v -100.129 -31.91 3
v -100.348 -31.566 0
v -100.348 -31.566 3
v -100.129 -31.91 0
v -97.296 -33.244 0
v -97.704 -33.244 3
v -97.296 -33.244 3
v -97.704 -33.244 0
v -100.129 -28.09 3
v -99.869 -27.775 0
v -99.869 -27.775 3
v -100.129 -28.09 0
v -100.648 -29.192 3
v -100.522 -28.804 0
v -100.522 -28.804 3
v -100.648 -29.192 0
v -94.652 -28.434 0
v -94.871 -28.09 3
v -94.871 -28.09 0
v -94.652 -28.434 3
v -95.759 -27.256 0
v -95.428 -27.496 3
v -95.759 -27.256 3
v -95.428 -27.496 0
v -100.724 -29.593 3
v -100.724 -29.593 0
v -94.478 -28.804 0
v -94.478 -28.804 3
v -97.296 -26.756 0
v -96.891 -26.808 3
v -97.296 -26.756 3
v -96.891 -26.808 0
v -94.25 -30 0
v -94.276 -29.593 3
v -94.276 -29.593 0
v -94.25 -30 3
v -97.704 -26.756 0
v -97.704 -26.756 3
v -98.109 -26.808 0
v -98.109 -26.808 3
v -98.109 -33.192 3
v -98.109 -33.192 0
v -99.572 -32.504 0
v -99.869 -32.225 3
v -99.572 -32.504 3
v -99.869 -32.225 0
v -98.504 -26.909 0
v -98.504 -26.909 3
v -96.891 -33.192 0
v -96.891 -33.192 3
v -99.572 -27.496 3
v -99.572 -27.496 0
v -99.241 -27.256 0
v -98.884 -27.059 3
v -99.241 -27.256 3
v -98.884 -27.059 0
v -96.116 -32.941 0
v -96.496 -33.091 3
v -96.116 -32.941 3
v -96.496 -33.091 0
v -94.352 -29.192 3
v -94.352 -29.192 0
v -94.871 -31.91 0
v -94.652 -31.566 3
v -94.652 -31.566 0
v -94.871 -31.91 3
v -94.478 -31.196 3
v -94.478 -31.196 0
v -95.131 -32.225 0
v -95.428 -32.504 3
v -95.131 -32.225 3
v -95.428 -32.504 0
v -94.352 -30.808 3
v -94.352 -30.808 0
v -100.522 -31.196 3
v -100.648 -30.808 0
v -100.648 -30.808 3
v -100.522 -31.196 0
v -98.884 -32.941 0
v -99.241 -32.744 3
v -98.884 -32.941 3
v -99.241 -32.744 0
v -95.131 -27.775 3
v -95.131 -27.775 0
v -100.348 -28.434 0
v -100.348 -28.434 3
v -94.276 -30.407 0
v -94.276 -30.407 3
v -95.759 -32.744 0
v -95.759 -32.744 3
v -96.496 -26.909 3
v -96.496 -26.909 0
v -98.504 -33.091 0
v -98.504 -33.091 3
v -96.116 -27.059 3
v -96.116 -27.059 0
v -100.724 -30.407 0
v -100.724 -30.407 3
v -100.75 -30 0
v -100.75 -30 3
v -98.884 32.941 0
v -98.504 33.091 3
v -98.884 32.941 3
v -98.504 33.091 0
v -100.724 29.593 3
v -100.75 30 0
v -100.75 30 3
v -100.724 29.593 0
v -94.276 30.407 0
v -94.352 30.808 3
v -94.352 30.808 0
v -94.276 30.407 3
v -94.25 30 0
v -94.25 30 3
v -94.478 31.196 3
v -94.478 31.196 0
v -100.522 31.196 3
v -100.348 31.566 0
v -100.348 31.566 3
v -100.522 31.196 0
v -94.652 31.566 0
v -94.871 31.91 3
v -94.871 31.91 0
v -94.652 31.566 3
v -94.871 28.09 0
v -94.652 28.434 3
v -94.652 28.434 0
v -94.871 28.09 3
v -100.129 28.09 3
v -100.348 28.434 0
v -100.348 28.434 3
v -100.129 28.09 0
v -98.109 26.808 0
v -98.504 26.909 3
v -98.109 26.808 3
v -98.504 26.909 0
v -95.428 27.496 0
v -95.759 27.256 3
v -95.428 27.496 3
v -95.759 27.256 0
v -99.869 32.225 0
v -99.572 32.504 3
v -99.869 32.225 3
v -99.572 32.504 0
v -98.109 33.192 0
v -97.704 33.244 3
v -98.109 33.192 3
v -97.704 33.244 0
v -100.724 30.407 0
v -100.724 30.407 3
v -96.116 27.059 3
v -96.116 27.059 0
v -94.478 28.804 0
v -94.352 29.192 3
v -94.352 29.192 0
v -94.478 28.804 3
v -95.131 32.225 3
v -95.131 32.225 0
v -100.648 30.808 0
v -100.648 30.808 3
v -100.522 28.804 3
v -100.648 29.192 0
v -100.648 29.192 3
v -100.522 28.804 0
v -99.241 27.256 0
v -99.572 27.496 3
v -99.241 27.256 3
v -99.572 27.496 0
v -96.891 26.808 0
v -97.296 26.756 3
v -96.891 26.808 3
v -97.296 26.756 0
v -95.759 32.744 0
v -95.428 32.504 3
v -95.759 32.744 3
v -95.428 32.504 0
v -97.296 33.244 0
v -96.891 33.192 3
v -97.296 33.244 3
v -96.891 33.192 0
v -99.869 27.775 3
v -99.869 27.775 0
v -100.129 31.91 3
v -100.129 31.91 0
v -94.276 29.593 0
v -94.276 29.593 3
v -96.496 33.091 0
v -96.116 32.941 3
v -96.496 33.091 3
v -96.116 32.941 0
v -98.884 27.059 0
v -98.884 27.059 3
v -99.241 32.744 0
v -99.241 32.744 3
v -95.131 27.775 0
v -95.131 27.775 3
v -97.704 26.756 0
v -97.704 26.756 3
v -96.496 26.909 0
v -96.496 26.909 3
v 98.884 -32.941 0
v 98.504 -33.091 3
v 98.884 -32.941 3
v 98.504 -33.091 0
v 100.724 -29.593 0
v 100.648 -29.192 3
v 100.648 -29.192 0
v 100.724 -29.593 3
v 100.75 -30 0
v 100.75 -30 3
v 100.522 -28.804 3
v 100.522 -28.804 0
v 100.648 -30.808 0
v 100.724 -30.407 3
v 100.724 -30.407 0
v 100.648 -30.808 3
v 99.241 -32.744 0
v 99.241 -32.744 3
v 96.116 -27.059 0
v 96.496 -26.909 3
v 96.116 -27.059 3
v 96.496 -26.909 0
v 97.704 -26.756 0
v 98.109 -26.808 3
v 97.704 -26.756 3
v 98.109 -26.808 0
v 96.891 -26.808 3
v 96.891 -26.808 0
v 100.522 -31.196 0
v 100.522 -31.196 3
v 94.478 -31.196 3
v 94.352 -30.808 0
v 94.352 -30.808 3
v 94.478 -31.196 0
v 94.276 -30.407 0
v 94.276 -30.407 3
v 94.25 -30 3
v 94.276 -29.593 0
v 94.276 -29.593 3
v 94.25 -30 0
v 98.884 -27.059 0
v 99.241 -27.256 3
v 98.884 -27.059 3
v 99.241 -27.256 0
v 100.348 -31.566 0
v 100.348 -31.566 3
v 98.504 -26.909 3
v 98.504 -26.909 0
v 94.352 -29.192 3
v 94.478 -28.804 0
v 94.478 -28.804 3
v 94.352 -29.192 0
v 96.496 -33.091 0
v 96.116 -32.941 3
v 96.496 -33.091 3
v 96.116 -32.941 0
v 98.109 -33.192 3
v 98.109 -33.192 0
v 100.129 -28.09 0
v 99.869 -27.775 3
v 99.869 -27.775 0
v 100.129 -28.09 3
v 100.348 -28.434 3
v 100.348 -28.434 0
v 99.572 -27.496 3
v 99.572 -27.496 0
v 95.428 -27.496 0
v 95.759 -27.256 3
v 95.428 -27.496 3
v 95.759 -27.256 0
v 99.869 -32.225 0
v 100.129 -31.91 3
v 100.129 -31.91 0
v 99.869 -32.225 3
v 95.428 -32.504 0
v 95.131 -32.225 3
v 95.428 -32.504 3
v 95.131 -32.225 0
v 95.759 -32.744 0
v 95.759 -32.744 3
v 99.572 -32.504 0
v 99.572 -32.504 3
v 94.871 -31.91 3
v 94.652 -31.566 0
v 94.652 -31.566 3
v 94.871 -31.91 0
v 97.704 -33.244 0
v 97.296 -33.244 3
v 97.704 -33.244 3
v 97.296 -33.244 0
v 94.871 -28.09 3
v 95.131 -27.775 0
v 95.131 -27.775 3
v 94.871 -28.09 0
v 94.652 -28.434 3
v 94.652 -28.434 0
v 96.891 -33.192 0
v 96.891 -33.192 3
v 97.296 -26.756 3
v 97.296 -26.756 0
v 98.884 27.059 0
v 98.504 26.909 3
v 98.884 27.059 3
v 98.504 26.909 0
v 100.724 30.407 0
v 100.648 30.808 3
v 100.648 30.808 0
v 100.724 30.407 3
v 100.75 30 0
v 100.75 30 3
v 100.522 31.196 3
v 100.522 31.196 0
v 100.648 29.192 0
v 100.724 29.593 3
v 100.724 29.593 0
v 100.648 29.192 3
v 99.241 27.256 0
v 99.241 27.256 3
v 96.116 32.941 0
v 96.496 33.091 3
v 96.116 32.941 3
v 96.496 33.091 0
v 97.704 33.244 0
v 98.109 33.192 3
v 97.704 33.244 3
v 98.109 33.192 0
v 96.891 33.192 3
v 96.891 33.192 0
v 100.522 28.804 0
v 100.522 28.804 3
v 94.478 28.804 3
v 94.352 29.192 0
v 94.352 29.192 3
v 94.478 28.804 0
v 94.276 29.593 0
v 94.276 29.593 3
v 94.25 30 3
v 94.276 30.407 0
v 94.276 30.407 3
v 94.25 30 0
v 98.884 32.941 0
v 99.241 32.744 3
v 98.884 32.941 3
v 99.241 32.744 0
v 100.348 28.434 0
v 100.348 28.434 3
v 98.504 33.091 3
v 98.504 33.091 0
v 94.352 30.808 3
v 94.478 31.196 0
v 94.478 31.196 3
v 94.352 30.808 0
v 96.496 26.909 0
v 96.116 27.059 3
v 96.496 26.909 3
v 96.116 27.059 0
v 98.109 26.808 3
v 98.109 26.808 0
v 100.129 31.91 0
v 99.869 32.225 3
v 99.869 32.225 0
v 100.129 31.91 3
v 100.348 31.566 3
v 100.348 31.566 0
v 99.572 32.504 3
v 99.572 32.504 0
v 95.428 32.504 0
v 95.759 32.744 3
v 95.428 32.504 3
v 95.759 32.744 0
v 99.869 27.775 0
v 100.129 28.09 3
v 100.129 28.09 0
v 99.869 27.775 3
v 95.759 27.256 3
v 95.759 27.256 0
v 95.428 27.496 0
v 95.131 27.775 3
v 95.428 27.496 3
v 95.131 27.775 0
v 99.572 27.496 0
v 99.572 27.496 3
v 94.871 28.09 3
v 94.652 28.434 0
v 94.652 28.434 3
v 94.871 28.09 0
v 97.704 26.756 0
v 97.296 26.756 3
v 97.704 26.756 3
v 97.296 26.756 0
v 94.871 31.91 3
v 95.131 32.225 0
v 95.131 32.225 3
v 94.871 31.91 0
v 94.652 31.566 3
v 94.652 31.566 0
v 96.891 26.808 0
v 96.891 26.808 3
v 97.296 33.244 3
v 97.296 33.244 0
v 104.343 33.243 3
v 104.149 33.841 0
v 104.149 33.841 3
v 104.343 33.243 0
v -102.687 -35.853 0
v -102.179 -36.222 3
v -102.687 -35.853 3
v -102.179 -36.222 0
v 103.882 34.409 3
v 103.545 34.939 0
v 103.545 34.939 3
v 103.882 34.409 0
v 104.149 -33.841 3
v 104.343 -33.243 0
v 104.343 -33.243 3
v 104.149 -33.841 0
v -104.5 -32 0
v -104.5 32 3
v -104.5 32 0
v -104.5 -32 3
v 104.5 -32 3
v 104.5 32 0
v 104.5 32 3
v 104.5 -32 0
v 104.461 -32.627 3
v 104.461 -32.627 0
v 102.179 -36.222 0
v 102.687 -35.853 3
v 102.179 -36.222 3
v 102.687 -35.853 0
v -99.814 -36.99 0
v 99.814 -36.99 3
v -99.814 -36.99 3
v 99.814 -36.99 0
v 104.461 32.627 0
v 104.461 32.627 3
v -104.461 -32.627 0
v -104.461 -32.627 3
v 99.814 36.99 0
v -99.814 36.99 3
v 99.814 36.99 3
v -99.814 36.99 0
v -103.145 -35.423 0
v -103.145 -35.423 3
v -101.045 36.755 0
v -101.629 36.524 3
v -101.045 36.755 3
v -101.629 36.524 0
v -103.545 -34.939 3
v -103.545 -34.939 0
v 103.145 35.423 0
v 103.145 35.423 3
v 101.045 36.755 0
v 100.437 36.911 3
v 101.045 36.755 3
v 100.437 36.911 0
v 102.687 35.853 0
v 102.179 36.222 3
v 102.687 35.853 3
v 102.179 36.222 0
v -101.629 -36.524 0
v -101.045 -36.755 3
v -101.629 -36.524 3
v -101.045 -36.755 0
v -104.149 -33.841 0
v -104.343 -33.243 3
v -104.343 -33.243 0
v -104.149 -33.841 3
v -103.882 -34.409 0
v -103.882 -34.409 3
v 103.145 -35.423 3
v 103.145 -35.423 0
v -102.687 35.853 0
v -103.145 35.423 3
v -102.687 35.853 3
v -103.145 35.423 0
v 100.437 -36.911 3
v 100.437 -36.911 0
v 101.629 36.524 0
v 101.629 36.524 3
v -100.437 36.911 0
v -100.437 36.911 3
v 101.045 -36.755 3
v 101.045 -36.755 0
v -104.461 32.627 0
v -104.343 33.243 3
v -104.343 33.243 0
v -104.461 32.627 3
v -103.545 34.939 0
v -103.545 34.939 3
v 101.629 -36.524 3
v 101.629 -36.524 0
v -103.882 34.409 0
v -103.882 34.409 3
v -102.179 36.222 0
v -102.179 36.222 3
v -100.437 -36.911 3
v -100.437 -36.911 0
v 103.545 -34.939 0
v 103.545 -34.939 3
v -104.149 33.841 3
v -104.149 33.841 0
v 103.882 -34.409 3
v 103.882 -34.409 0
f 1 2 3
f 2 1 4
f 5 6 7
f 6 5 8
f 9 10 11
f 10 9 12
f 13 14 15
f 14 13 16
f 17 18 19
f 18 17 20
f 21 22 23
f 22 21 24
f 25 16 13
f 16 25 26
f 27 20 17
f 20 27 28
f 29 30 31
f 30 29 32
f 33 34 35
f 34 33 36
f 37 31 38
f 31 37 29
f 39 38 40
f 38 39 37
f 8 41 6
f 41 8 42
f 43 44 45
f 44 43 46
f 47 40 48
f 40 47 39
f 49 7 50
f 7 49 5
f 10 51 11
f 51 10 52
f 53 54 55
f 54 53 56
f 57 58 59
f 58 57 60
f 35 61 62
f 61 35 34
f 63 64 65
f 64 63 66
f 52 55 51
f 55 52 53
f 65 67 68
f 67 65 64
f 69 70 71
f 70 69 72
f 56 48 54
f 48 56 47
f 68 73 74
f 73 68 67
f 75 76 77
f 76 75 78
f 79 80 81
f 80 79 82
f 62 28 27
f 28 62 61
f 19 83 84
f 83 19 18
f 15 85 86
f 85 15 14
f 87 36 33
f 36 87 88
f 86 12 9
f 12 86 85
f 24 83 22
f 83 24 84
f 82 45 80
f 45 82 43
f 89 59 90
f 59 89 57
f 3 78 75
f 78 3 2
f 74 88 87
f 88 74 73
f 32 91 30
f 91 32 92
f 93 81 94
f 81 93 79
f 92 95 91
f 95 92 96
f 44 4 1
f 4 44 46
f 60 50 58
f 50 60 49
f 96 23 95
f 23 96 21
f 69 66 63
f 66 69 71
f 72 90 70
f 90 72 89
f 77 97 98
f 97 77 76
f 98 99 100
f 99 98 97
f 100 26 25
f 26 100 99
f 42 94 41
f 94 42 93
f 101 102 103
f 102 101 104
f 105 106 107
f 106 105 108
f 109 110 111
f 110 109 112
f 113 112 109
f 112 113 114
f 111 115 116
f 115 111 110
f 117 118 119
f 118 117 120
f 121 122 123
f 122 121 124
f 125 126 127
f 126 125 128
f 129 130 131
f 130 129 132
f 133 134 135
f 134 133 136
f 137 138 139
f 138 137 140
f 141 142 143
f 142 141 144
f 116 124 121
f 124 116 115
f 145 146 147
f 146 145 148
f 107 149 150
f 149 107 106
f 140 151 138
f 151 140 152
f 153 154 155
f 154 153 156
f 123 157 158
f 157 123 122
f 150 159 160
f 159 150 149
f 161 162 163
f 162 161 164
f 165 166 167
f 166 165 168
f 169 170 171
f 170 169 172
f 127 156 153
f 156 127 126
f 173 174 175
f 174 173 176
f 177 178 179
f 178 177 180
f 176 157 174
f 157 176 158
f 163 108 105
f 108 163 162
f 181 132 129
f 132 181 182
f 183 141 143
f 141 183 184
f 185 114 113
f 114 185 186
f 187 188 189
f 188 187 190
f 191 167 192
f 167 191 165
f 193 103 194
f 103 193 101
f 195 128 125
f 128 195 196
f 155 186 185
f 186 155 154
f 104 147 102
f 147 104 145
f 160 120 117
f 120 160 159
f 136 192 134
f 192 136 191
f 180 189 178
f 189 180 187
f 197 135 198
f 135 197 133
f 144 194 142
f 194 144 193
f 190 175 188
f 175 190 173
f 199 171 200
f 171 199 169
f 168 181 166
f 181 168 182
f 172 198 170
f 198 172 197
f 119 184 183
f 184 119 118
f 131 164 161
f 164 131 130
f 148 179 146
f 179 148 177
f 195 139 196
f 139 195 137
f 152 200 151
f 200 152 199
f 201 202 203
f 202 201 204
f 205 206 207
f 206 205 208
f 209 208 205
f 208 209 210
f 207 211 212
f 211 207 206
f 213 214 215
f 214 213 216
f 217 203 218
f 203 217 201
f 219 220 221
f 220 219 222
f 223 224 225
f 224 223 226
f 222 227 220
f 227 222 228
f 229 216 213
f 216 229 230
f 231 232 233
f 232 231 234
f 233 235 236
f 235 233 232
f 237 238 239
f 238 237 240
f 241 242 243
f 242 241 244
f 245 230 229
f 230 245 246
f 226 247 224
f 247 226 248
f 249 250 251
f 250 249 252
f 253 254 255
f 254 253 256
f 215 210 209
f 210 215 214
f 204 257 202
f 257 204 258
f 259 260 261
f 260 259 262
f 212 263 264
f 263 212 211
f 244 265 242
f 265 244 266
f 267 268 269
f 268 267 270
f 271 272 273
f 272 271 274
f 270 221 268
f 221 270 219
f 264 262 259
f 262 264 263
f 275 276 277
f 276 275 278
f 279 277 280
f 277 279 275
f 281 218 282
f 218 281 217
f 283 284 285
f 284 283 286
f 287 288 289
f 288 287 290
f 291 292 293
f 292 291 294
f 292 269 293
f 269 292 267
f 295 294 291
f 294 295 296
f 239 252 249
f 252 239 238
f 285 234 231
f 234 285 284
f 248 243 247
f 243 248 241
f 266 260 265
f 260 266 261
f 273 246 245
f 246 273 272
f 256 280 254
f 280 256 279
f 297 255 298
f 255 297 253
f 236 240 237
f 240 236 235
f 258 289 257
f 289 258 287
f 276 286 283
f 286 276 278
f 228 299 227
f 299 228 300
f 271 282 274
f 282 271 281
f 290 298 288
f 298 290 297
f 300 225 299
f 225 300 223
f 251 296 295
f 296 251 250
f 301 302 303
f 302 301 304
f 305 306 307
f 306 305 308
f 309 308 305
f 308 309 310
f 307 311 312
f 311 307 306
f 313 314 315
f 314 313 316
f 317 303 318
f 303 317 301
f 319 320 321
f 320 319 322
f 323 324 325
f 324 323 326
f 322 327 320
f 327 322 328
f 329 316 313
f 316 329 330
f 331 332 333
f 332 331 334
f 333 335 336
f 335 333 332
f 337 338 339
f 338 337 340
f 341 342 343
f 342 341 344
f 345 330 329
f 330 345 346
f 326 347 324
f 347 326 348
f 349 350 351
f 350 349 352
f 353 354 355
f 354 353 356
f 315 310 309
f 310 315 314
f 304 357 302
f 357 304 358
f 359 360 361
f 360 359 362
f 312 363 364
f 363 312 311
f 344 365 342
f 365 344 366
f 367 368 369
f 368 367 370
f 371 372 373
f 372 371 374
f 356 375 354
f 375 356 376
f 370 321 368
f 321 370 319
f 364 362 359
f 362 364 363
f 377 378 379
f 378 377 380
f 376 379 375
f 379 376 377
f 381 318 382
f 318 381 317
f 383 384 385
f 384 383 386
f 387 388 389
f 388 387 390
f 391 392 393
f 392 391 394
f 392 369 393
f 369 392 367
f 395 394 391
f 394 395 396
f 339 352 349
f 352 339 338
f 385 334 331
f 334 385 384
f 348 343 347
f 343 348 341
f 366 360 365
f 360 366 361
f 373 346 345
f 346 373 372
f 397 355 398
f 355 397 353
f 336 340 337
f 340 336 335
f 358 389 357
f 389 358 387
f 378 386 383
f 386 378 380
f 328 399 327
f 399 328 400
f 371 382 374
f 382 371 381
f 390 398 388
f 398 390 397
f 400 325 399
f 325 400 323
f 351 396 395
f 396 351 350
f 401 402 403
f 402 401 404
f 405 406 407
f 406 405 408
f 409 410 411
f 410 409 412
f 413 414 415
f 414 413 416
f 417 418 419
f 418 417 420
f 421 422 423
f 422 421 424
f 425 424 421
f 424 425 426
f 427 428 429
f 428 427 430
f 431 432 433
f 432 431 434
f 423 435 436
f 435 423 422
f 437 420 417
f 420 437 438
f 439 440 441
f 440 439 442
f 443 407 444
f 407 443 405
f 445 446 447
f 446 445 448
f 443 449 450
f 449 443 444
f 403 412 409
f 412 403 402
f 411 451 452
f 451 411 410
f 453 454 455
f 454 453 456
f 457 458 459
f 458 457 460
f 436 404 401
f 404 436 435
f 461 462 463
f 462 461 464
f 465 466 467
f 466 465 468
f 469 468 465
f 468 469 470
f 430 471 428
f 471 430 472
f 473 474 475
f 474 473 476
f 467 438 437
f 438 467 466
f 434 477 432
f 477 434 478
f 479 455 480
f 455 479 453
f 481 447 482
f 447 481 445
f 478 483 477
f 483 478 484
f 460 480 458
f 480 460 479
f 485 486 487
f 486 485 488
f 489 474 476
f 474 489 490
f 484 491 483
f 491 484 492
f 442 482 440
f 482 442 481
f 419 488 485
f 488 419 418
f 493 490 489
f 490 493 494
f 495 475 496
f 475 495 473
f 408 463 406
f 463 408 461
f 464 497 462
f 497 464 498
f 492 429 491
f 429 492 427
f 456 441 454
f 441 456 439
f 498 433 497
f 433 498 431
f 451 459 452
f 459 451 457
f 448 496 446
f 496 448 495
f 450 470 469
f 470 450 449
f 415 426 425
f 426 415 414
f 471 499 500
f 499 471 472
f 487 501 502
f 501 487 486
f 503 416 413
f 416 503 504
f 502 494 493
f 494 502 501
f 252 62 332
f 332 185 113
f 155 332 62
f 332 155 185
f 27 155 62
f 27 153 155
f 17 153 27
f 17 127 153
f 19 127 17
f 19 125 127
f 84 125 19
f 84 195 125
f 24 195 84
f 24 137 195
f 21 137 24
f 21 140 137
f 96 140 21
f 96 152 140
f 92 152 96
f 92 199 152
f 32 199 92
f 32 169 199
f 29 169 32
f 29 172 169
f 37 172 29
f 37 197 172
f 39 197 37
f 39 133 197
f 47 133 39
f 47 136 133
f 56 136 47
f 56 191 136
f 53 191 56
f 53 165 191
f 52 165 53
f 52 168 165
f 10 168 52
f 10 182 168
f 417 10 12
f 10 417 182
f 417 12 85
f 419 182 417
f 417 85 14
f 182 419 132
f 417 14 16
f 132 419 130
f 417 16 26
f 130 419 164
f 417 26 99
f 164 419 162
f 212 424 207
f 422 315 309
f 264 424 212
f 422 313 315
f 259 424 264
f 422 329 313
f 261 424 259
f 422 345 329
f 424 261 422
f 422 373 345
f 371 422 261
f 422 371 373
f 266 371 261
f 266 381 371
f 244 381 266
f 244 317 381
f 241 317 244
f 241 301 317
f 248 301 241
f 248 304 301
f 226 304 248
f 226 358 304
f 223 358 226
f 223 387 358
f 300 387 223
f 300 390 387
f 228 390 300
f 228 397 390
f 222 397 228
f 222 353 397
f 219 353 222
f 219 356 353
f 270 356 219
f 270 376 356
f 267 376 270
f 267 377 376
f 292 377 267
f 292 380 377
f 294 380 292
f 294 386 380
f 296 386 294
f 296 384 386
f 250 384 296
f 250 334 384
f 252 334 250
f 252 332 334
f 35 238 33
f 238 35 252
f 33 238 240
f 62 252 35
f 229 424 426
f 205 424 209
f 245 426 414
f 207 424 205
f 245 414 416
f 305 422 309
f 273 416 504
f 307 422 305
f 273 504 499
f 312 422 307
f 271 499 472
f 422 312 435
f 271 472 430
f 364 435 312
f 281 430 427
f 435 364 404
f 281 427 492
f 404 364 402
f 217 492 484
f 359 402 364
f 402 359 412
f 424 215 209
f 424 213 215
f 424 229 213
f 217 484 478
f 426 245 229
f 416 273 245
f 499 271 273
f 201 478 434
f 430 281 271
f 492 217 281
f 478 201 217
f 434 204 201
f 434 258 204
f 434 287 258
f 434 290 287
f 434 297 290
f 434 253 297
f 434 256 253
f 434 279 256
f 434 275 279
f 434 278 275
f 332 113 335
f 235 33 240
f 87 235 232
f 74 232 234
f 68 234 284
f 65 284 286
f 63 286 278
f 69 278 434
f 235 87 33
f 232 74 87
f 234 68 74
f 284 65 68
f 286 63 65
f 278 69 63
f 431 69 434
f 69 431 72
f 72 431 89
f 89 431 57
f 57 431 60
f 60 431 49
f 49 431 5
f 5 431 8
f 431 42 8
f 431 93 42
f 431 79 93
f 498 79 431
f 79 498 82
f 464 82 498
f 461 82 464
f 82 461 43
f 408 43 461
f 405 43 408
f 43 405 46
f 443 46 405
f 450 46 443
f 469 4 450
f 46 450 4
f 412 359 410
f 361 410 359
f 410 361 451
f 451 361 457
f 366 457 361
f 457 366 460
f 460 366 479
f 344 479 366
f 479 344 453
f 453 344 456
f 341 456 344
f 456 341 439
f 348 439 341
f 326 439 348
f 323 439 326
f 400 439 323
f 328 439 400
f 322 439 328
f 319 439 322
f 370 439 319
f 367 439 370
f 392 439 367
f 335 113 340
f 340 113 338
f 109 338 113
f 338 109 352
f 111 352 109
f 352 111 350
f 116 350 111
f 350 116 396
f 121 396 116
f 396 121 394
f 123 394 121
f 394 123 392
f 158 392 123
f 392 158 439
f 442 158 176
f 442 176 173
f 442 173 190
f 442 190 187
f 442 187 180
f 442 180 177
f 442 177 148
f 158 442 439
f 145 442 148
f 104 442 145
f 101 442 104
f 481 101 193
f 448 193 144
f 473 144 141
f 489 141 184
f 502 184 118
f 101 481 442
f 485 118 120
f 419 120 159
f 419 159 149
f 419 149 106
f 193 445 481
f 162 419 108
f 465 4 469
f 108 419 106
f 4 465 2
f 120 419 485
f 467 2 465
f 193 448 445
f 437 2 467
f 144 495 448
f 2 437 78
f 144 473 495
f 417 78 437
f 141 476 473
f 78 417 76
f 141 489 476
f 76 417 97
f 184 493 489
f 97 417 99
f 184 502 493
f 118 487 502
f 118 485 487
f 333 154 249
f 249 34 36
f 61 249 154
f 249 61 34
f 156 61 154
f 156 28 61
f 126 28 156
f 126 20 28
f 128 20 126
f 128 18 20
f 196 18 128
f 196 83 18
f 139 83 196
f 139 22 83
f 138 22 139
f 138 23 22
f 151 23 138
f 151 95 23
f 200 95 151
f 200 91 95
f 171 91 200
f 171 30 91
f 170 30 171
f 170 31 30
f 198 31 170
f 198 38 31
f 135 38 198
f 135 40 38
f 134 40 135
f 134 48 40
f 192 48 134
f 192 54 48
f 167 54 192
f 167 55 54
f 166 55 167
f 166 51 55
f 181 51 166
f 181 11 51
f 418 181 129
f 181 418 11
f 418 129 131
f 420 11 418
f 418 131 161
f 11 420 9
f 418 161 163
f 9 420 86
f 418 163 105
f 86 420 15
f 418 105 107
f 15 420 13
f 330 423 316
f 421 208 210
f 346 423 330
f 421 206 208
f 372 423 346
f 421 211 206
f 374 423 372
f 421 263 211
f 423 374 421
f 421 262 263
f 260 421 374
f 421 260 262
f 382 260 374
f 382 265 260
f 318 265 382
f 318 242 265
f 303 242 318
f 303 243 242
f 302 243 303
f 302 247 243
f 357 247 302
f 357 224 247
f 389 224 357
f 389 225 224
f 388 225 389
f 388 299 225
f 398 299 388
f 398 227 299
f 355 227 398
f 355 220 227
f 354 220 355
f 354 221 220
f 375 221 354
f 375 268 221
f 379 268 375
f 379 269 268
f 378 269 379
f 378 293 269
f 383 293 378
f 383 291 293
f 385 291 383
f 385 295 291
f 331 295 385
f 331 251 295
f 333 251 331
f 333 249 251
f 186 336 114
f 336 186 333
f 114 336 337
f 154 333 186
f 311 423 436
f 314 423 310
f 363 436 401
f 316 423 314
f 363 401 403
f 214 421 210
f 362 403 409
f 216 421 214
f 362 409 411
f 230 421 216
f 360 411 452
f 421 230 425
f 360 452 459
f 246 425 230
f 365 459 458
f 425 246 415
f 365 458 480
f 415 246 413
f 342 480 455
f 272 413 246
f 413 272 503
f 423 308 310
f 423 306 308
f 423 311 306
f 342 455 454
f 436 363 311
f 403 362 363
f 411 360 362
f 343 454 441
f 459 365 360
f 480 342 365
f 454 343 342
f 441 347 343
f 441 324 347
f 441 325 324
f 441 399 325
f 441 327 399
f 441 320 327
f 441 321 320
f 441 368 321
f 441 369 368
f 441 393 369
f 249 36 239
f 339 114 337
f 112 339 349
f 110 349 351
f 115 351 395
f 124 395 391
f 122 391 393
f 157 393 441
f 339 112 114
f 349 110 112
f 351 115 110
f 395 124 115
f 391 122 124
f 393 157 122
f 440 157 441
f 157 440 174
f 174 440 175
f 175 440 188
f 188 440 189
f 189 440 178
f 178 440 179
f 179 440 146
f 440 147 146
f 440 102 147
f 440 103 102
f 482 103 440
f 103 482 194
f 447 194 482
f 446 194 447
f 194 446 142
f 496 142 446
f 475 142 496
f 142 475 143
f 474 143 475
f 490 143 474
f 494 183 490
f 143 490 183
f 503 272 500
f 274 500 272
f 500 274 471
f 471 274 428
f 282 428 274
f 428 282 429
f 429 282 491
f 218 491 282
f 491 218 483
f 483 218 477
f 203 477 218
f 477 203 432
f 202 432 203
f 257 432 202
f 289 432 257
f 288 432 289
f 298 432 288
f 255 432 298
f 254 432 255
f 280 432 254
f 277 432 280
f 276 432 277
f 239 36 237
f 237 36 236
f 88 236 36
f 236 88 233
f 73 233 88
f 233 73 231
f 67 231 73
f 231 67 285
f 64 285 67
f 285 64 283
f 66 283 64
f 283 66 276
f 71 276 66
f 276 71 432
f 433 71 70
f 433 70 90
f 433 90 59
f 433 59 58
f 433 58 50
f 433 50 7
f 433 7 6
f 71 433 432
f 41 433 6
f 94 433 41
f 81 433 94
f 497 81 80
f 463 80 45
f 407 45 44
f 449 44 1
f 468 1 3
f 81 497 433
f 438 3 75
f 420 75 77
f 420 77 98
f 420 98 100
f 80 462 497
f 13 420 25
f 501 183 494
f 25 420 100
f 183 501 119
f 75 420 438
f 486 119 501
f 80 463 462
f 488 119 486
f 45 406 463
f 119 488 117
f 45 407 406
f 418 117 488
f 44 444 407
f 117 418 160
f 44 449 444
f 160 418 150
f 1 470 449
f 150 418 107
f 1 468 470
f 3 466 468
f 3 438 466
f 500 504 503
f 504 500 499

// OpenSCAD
$fn = 50;


difference() {
	union() {
		hull() {
			translate(v = [-99.5000000000, 32.0000000000, 0]) {
				cylinder(h = 3, r = 5);
			}
			translate(v = [99.5000000000, 32.0000000000, 0]) {
				cylinder(h = 3, r = 5);
			}
			translate(v = [-99.5000000000, -32.0000000000, 0]) {
				cylinder(h = 3, r = 5);
			}
			translate(v = [99.5000000000, -32.0000000000, 0]) {
				cylinder(h = 3, r = 5);
			}
		}
	}
	union() {
		translate(v = [-97.5000000000, -30.0000000000, -100.0000000000]) {
			cylinder(h = 200, r = 3.2500000000);
		}
		translate(v = [-97.5000000000, 30.0000000000, -100.0000000000]) {
			cylinder(h = 200, r = 3.2500000000);
		}
		translate(v = [97.5000000000, -30.0000000000, -100.0000000000]) {
			cylinder(h = 200, r = 3.2500000000);
		}
		translate(v = [97.5000000000, 30.0000000000, -100.0000000000]) {
			cylinder(h = 200, r = 3.2500000000);
		}
	}
}
